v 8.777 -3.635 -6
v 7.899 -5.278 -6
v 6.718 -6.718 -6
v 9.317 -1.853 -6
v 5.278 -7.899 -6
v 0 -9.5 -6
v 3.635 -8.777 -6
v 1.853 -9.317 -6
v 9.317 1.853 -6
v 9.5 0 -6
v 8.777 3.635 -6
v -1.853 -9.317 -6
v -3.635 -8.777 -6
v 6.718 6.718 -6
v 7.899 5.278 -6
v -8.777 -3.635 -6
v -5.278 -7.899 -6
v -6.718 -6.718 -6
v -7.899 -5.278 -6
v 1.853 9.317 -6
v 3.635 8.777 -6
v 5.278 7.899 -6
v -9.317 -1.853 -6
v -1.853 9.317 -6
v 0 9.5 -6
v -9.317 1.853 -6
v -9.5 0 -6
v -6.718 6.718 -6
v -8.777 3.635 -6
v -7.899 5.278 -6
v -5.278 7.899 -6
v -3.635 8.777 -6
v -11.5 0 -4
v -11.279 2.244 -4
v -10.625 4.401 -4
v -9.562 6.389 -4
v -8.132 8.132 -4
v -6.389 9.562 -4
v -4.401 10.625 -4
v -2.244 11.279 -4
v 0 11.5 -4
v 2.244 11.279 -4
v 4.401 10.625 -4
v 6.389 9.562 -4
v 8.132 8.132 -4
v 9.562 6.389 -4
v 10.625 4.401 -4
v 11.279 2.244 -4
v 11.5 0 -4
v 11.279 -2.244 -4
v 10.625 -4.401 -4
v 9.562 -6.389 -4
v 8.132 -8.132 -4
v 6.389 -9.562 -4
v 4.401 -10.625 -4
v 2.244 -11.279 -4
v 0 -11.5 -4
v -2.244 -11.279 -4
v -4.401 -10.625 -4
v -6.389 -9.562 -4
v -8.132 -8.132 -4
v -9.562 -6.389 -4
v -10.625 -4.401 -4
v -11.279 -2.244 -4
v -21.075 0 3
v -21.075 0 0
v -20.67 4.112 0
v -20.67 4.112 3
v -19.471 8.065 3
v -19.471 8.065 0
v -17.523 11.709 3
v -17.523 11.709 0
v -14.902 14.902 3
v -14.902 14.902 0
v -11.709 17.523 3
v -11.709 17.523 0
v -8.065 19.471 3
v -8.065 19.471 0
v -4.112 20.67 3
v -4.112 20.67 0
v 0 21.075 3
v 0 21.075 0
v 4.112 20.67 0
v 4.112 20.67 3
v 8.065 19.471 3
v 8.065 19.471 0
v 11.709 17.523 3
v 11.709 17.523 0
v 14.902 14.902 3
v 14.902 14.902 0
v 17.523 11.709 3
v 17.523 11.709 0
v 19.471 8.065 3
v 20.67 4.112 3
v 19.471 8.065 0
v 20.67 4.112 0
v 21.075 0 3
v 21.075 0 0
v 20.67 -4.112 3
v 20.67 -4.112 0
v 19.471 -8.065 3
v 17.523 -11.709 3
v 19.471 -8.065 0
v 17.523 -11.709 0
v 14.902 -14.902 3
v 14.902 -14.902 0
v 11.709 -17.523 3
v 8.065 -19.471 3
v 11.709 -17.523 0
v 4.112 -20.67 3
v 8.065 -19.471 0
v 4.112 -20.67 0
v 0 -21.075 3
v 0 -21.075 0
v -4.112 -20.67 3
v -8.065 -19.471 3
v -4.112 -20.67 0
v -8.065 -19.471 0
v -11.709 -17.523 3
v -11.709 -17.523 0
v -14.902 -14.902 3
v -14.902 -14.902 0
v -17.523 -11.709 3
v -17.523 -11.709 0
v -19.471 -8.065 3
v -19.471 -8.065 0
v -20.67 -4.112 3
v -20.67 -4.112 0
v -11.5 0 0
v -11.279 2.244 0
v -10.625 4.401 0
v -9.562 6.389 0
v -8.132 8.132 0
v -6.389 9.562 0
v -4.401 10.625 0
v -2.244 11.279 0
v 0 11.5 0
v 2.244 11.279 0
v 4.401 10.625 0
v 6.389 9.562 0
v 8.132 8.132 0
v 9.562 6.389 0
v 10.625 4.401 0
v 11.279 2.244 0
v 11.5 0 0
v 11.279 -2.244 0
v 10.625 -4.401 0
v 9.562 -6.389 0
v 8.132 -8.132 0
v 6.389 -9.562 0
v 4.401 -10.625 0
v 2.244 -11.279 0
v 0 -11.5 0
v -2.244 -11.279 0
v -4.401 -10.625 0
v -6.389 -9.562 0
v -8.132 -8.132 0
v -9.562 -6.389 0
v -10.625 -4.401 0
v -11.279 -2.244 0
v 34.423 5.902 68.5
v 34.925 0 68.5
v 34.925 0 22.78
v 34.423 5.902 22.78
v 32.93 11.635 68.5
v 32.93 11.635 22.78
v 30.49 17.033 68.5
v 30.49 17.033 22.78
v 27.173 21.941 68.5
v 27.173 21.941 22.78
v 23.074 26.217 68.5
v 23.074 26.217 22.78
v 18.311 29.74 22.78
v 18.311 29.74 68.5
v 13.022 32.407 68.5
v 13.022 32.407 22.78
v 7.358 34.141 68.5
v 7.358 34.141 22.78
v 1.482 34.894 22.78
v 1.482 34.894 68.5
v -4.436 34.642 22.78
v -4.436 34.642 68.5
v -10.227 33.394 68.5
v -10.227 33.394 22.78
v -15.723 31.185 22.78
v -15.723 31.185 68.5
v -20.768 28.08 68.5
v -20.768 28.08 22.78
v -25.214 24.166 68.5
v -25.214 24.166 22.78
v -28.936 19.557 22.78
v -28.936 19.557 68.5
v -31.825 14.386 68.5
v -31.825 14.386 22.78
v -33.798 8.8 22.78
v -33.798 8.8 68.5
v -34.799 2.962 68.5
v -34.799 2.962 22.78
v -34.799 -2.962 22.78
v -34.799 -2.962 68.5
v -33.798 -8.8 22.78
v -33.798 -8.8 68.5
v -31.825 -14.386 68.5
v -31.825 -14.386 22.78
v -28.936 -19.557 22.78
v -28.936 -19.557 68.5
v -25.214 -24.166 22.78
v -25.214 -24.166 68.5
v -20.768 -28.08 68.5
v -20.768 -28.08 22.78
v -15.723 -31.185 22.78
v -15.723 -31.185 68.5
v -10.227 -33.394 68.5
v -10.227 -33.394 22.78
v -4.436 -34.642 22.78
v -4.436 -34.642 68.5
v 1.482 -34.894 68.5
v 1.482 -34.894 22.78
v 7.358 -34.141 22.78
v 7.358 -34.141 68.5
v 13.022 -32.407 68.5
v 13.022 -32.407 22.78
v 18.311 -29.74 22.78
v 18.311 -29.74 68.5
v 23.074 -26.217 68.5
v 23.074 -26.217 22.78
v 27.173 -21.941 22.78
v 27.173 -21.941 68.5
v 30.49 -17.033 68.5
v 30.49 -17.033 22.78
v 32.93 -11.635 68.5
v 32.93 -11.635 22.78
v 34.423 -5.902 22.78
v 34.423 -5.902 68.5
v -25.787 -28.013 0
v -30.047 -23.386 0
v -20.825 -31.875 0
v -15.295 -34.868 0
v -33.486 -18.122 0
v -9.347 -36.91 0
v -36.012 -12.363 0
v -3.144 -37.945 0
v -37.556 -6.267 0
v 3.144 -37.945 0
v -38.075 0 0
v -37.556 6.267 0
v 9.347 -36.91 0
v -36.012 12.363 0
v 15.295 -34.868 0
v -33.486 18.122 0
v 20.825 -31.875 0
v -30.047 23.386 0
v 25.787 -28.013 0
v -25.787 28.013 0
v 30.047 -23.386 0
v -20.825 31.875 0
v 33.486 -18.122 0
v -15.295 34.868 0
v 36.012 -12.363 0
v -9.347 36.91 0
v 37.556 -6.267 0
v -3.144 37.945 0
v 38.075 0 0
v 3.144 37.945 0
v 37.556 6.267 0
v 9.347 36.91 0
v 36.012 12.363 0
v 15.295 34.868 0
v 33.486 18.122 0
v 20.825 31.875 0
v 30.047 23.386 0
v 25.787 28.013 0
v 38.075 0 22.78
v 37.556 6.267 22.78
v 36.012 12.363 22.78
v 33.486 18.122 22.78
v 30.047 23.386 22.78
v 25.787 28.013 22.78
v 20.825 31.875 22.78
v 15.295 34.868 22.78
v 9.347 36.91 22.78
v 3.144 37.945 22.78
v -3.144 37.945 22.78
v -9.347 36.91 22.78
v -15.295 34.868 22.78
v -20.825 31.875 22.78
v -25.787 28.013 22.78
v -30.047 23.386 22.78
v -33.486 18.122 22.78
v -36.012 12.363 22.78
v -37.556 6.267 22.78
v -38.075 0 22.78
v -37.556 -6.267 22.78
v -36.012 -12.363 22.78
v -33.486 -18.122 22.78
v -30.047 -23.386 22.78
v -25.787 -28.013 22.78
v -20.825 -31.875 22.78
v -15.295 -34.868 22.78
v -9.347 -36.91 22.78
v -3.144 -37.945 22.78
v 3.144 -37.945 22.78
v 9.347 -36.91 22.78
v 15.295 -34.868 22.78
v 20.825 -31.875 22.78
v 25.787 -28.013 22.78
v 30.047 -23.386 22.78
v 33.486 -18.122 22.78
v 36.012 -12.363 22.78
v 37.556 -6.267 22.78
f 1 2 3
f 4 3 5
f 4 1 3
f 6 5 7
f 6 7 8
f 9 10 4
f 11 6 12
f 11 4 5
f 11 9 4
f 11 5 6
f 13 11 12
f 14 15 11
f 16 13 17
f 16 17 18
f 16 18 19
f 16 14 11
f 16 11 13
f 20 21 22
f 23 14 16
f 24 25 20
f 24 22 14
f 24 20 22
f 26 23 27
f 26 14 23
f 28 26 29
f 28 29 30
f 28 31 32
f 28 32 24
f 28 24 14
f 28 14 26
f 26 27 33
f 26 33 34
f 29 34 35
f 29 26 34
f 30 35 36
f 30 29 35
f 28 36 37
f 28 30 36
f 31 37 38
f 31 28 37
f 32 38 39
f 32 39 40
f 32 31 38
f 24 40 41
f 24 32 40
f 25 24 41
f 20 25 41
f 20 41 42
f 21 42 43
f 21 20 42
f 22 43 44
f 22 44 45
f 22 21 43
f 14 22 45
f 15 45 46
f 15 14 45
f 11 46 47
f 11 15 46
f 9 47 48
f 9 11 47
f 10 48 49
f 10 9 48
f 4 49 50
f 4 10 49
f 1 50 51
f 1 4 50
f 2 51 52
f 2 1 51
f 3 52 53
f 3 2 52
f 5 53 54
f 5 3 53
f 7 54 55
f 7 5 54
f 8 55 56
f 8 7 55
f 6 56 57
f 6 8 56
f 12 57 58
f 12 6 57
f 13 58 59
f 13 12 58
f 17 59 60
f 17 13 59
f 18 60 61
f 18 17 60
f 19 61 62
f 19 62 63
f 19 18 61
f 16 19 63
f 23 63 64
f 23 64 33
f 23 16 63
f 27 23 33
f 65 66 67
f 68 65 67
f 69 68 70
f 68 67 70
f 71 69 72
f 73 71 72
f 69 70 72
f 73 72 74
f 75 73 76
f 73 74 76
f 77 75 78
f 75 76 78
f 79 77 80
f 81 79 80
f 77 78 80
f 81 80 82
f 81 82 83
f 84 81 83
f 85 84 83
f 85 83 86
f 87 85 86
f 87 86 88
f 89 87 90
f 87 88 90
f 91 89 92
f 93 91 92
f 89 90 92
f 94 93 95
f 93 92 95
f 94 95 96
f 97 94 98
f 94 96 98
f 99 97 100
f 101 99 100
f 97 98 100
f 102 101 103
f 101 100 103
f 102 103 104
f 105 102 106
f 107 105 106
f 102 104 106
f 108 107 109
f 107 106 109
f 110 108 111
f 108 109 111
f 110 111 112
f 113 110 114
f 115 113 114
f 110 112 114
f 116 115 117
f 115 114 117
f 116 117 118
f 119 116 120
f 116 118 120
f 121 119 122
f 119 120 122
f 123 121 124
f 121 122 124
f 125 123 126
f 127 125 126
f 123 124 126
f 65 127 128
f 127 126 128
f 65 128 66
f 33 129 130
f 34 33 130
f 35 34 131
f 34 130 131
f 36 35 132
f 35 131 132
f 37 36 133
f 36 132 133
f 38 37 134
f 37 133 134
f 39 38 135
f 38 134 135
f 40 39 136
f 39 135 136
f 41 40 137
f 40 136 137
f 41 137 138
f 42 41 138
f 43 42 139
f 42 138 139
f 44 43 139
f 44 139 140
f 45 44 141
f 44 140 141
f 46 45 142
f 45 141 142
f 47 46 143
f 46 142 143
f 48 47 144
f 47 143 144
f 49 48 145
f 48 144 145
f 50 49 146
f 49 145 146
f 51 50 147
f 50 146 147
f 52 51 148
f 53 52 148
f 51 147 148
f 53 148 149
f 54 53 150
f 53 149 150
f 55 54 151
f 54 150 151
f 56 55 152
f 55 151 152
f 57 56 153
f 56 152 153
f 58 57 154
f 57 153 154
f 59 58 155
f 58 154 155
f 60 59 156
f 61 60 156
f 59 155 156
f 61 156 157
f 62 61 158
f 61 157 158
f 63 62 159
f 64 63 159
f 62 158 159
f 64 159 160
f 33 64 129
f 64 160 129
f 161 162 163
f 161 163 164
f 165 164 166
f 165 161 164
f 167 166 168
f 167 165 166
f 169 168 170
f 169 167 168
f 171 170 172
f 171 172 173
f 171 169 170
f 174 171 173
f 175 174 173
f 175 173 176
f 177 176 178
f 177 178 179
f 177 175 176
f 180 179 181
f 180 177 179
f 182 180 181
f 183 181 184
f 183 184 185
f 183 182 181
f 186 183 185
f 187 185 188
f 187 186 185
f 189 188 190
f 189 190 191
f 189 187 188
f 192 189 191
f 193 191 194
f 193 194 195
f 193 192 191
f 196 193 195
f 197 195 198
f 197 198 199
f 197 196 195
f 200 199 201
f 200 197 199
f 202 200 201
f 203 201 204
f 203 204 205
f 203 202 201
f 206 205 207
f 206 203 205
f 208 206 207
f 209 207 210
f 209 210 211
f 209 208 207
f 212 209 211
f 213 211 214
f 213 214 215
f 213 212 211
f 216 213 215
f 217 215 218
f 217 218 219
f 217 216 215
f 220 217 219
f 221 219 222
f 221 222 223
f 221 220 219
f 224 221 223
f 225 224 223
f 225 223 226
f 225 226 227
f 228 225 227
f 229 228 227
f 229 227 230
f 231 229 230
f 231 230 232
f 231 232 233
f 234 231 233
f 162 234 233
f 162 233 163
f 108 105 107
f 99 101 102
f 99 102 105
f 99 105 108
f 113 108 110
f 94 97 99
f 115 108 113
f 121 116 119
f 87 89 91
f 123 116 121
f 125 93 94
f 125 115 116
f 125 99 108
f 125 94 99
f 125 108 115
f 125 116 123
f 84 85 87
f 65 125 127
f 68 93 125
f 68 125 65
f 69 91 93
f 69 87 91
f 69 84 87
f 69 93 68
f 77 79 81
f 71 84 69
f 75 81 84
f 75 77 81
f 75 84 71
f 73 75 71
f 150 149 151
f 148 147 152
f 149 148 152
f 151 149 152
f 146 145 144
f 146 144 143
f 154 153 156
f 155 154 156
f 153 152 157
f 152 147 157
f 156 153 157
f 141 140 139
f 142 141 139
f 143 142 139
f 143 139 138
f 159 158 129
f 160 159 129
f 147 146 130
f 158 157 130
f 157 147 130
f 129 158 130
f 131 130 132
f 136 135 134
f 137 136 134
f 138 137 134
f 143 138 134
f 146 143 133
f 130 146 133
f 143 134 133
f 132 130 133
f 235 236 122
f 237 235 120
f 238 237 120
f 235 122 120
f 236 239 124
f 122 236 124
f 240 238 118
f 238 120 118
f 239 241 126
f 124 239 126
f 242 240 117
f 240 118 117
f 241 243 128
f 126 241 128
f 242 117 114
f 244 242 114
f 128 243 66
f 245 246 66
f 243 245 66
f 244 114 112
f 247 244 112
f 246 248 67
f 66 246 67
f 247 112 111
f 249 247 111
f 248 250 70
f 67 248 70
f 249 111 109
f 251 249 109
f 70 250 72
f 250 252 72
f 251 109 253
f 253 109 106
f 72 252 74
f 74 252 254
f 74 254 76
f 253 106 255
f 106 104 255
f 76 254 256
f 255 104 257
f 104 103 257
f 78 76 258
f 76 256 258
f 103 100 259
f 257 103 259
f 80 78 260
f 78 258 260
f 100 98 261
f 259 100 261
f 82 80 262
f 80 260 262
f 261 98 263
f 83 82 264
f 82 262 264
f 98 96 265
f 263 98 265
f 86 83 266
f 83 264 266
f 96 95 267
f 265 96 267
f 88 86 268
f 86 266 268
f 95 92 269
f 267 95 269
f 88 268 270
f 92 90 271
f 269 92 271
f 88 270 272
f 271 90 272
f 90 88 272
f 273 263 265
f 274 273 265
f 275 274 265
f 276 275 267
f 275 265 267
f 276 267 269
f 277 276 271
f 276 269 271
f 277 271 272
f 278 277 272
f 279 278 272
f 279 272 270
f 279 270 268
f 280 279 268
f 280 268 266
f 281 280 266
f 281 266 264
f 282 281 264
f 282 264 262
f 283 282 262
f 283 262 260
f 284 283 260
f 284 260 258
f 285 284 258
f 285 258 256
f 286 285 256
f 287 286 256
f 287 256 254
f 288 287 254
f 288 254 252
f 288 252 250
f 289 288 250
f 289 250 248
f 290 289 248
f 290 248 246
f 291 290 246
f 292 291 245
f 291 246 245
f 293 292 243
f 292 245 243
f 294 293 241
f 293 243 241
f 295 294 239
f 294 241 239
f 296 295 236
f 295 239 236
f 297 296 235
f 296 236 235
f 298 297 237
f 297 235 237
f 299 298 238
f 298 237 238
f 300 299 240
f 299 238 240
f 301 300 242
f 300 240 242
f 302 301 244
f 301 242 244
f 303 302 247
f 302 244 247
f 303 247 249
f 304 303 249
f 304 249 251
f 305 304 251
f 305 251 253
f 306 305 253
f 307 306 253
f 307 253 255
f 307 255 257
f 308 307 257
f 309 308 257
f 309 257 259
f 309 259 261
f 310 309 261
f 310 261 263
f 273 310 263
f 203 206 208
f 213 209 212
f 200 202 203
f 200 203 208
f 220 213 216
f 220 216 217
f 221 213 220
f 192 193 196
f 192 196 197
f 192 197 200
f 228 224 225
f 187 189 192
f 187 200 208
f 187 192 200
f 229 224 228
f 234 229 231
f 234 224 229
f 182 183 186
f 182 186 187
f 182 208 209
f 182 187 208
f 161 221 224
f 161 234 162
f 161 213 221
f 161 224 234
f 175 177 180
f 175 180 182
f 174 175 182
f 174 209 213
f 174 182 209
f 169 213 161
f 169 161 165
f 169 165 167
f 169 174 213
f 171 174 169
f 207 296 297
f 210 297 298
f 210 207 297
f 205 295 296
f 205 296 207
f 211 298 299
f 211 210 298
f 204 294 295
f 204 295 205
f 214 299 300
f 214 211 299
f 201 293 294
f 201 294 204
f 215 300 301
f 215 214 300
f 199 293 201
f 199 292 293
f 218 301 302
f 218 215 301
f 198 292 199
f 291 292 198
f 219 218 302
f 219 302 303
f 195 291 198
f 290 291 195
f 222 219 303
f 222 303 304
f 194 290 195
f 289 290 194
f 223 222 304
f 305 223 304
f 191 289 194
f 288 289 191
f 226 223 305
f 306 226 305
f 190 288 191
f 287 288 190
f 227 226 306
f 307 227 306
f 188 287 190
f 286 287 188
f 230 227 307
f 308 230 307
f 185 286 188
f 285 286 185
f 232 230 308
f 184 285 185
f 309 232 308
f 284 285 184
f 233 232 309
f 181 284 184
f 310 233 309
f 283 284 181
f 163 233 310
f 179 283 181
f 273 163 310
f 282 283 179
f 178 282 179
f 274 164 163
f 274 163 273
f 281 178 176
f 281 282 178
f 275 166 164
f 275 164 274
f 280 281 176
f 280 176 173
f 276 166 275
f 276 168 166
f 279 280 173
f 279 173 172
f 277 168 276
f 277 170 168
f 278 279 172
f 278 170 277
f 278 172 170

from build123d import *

# Parameters (mm, degrees)
SKETCH1_R           = 38.075
BOSS_EXTRUDE1_DEPTH = 68.5
SKETCH2_R           = 11.5
BOSS_EXTRUDE2_DEPTH = 6
CHAMFER1_SIZE       = 2
SKETCH3_R           = 21.075
CUT_EXTRUDE1_DEPTH  = 3
SKETCH8_R           = 38.075
SKETCH8_R_2         = 34.925
CUT_EXTRUDE2_DEPTH  = 45.72


with BuildPart() as part:
    # Sketch1 → Boss-Extrude1 (new body)
    with BuildSketch(Plane.XY):
        Circle(SKETCH1_R)
    extrude(amount=BOSS_EXTRUDE1_DEPTH)

    # Sketch2 → Boss-Extrude2 (add)
    with BuildSketch(Plane(origin=(0, 0, 0), x_dir=(-1, 0, 0), z_dir=(0, 0, -1))):
        Circle(SKETCH2_R)
    extrude(amount=BOSS_EXTRUDE2_DEPTH)

    # Chamfer1
    chamfer1_edges = [part.edges().sort_by_distance(p)[0] for p in [
        (11.5, 0, -6),
    ]]
    chamfer(chamfer1_edges, length=CHAMFER1_SIZE)

    # Sketch3 → Cut-Extrude1 (cut)
    with BuildSketch(Plane(origin=(0, 0, 0), x_dir=(-1, 0, 0), z_dir=(0, 0, -1))):
        Circle(SKETCH3_R)
    extrude(amount=-CUT_EXTRUDE1_DEPTH, mode=Mode.SUBTRACT)


with BuildPart() as cut_extrude1_piece_1:
    # of the separate pieces the step leaves, piece 1, a body of its own (cut_extrude1_pieces)
    add(part.part.solids().sort_by_distance((38.075, 0, 0))[0])

    # Sketch8 → Cut-Extrude2 (cut)
    with BuildSketch(Plane.XY.offset(68.5)):
        Circle(SKETCH8_R)
        Circle(SKETCH8_R_2, mode=Mode.SUBTRACT)
    extrude(amount=-CUT_EXTRUDE2_DEPTH, mode=Mode.SUBTRACT)


with BuildPart() as cut_extrude1_piece_2:
    # of the separate pieces the step leaves, piece 2, a body of its own (cut_extrude1_pieces)
    add(part.part.solids().sort_by_distance((-11.5, 0, -4))[0])


solid = Compound([cut_extrude1_piece_1.part, cut_extrude1_piece_2.part])
